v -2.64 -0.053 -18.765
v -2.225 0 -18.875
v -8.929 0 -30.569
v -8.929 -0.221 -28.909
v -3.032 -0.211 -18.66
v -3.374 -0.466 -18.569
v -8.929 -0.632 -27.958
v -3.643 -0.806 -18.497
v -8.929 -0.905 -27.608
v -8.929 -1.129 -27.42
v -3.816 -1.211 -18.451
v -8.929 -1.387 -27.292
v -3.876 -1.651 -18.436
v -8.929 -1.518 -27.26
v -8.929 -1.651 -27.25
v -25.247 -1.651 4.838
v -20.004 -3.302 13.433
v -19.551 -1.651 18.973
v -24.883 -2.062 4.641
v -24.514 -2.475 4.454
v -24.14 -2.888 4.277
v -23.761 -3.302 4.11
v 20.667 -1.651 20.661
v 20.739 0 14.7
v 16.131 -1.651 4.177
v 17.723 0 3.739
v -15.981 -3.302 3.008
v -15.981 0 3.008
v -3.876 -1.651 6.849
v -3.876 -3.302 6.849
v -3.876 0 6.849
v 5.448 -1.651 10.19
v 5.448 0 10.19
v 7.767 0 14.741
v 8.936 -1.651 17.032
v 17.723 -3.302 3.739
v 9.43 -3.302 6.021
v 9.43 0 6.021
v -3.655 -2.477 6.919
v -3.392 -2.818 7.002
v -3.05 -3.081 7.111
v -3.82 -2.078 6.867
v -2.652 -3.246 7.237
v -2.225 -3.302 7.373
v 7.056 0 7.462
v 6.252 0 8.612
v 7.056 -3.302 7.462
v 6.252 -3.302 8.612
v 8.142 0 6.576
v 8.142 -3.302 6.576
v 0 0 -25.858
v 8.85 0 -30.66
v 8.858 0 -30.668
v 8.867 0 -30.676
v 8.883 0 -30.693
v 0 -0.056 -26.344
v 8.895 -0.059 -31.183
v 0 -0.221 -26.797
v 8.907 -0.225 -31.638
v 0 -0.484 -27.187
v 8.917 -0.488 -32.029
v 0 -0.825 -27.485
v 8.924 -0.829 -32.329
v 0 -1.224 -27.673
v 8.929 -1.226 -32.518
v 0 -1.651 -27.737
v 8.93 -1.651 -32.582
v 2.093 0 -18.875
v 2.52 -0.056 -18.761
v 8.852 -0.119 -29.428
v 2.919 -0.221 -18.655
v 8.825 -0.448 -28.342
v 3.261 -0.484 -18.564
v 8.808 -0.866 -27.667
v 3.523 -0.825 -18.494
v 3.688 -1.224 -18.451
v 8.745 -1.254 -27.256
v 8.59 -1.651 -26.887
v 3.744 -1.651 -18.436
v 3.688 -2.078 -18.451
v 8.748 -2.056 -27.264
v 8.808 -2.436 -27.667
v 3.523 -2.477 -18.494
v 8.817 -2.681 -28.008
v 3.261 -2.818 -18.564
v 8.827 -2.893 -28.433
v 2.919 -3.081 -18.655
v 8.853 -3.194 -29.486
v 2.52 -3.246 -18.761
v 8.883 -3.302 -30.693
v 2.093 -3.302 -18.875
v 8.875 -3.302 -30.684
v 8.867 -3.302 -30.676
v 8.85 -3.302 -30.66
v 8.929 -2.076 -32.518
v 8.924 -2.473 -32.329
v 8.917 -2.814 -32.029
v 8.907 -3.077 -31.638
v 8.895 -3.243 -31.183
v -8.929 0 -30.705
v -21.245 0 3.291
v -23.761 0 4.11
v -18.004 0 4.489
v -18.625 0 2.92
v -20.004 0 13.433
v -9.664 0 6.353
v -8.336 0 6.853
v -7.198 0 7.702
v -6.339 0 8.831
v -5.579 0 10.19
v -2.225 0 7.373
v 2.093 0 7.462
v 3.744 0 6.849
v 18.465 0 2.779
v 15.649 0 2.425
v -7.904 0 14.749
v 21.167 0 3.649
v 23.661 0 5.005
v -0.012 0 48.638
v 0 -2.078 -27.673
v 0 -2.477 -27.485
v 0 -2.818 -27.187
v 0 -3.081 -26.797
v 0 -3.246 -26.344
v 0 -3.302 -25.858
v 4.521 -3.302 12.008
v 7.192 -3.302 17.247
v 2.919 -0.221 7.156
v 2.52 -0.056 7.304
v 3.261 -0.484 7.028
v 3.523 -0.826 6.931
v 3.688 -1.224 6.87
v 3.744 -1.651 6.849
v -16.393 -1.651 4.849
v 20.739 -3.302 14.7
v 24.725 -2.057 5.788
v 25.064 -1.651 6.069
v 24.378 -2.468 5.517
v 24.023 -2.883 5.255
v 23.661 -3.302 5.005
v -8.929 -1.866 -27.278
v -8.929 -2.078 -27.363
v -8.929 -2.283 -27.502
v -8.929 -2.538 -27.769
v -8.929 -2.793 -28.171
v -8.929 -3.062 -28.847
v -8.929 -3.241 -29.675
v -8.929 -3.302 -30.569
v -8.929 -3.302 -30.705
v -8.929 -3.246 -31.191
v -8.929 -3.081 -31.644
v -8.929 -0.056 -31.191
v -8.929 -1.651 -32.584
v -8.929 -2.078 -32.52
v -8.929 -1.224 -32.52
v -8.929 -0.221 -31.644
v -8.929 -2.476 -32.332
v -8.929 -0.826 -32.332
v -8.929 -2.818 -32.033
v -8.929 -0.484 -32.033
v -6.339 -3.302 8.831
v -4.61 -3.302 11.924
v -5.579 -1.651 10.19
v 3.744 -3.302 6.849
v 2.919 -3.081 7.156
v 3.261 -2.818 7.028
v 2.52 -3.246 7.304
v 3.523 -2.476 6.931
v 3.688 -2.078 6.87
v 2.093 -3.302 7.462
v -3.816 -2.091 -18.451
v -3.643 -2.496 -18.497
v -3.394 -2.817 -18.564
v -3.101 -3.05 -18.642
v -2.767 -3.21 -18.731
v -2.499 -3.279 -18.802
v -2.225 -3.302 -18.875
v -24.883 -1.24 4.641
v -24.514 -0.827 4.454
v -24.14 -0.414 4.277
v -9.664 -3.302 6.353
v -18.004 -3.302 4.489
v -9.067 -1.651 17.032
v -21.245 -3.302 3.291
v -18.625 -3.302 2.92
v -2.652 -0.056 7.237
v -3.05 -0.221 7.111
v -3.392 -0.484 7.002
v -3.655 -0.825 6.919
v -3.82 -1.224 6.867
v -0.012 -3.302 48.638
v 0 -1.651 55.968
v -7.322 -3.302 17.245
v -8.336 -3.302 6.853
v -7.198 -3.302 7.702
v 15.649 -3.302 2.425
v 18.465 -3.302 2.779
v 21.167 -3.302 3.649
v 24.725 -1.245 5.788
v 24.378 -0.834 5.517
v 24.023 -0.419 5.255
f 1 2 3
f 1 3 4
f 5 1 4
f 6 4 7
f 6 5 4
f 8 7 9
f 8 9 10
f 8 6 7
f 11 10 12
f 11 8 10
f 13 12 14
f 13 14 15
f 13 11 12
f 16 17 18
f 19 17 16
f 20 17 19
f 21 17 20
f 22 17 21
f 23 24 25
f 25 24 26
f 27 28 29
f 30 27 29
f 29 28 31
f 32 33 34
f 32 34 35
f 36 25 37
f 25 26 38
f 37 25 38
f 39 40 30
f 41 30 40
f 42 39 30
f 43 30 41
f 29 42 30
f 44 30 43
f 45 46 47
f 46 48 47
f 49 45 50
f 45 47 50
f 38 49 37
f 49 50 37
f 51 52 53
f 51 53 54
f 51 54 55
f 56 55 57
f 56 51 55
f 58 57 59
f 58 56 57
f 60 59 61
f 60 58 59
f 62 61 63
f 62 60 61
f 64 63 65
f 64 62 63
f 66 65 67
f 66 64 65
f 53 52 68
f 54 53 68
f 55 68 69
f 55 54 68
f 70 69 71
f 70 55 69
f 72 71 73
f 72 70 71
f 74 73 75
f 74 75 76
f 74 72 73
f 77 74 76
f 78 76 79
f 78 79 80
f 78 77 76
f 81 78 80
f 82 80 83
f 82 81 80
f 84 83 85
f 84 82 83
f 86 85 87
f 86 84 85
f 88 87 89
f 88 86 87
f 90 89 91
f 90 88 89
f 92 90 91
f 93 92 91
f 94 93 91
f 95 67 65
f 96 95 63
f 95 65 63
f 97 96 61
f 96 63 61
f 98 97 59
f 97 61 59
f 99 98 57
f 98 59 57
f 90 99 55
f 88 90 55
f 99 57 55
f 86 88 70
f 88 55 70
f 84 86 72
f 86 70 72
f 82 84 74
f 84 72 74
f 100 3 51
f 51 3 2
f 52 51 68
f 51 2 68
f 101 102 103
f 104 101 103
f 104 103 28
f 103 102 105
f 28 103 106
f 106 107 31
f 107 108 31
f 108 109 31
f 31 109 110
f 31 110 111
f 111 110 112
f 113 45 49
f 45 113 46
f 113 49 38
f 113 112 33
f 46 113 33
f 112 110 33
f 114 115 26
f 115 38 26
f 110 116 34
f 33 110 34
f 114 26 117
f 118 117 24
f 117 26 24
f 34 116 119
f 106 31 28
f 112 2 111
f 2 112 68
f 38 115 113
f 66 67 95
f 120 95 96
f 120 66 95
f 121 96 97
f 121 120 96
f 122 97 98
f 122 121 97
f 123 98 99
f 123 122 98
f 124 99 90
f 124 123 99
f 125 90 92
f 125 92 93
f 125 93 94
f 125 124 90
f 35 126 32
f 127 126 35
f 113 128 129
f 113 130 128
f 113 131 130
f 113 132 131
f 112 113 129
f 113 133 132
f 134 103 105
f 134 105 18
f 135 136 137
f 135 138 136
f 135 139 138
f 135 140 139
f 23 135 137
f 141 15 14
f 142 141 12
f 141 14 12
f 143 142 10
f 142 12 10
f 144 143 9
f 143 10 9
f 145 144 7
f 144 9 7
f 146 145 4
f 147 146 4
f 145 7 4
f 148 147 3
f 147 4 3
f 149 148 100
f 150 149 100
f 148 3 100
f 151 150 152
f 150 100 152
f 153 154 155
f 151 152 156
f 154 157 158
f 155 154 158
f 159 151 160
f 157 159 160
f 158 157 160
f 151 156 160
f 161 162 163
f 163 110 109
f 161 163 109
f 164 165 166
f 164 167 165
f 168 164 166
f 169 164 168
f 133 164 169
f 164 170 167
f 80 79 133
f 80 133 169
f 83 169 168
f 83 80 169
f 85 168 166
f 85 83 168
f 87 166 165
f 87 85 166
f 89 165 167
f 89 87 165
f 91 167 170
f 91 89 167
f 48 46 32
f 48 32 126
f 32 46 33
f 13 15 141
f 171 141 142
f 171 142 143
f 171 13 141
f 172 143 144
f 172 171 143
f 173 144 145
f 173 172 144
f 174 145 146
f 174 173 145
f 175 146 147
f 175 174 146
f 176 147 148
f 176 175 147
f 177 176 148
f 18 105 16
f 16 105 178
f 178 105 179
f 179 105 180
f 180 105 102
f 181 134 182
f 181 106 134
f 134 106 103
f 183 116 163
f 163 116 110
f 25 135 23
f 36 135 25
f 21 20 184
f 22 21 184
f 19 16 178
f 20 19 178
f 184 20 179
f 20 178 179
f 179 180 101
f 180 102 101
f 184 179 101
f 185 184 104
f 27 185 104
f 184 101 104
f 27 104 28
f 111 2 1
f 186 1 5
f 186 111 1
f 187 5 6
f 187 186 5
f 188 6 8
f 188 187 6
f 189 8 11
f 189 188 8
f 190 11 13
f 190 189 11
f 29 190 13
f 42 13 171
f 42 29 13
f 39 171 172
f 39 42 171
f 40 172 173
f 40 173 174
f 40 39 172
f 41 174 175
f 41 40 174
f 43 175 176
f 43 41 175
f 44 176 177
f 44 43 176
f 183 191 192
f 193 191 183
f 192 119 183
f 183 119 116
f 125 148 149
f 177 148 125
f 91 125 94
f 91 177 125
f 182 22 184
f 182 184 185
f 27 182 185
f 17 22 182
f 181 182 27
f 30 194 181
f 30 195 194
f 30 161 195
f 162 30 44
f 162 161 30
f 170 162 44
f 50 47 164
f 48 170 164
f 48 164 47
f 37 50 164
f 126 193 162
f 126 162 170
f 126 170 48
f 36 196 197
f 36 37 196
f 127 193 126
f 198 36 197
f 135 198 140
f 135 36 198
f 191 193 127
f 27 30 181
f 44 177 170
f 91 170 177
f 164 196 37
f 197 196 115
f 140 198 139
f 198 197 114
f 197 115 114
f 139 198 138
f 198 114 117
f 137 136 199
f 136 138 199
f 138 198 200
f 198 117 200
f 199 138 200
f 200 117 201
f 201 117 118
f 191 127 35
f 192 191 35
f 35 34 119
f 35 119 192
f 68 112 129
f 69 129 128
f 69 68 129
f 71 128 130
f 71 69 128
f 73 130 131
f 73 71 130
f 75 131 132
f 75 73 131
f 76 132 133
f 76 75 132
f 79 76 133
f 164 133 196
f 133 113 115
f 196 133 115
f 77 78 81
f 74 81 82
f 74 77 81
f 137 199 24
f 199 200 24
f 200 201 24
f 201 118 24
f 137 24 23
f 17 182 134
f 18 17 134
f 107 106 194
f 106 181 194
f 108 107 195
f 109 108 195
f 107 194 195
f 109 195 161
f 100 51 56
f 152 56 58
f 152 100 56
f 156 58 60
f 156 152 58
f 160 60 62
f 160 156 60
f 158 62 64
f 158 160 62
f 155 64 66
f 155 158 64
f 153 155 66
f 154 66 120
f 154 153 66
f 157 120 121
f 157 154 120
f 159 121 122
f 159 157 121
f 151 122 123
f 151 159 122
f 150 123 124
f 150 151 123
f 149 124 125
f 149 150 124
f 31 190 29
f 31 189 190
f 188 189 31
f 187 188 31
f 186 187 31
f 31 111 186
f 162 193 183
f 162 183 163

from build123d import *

# Parameters (mm, degrees)
F1_DEPTH      = 3.302
F2_SIZE       = 1.65099
F3_R          = 5.08
F4_T1_DEPTH   = 5.391144251
F4_T6_DEPTH   = 33.5393354473
F4_T12_DEPTH  = 33.5393354473
F4_T18_DEPTH  = 33.5393354473
F4_T24_DEPTH  = 33.5393354473
F4_T30_DEPTH  = 18.415
F4_T35_DEPTH  = 18.415
F4_T40_DEPTH  = 18.415
F4_T45_DEPTH  = 18.415
F4_T50_DEPTH  = 18.415
F4_T55_DEPTH  = 18.415
F4_T60_DEPTH  = 18.415
F4_T65_DEPTH  = 18.415
F4_T71_DEPTH  = 18.415
F4_T75_DEPTH  = 33.5393354473
F4_T82_DEPTH  = 33.5393354473
F4_T86_DEPTH  = 18.415
F4_T93_DEPTH  = 18.415
F4_T97_DEPTH  = 33.5393354473
F4_T104_DEPTH = 33.5393354473
F4_T108_DEPTH = 18.415
F4_T115_DEPTH = 18.415
F4_T119_DEPTH = 18.415
F4_T126_DEPTH = 18.415
F4_T130_DEPTH = 18.415


# Not quite as in the source:
# - a fillet or chamfer that OpenCascade refuses, or shapes differently, is made with other operations: its cross-section is extruded or revolved along the edge and cut away or added
# - a fillet or chamfer is up to 0.001 mm smaller than in the source, because OpenCascade refuses the exact size


with BuildPart() as f1:
    # F0 (on Front) → F1 (new body)
    with BuildSketch(Plane.XZ):
        Polygon((-8.9293484636, -27.2495914251), (-8.9293484636, -32.5835914251), (0, -27.7367021117), (8.9302421297, -32.5819446757), (8.7977098301, -27.2495914251), (3.7441806833, -18.4355433674), (-3.8758193167, -18.4355433674), align=None)
        Polygon((-3.8758193167, 6.8487920798), (-3.8758193167, -18.4355433674), (3.7441806833, -18.4355433674), (3.7441806833, 6.8487920798), (5.4475756045, 10.1900669473), (8.9355429432, 17.0318494737), (0, 55.9675879776), (-9.0671815766, 17.0318494737), (-5.5792142379, 10.1900669473), align=None)
        Polygon((-15.9811842538, 3.0082010134), (-3.8758193167, 6.8487920798), (-5.5792142379, 10.1900669473), (-7.4475542642, 6.8487920798), (-16.3927144946, 4.8489290213), align=None)
        Polygon((5.4475756045, 10.1900669473), (3.7441806833, 6.8487920798), (15.648767343, 2.4249005283), (16.1309282999, 4.1770842273), (7.269941736, 6.61542546), align=None)
        with BuildLine():
            ThreePointArc((-25.2471491773, 4.8381724725), (-20.7595085955, 3.1872557237), (-15.9811842538, 3.0082010134))
            Line((-15.9811842538, 3.0082010134), (-16.3927144946, 4.8489290213))
            Line((-16.3927144946, 4.8489290213), (-19.5505233946, 18.973449431))
            Line((-19.5505233946, 18.973449431), (-25.2471491773, 4.8381724725))
        make_face()
        with BuildLine():
            Line((16.1309282999, 4.1770842273), (15.648767343, 2.4249005283))
            ThreePointArc((15.648767343, 2.4249005283), (20.6670070739, 3.4448326602), (25.0641160129, 6.0694134893))
            Line((25.0641160129, 6.0694134893), (20.6670070739, 20.6612959236))
            Line((20.6670070739, 20.6612959236), (16.1309282999, 4.1770842273))
        make_face()
    extrude(amount=F1_DEPTH)

    # F2 (size 1.651 in the source; OpenCascade refuses exactly that, so slightly less here)
    f2_edges = [f1.edges().sort_by_distance(p)[0] for p in [
        (4.467771, -3.302, 36.499719),
        (-4.533591, -3.302, 36.499719),
        (18.398968, -3.302, 12.41919),
        (22.865562, -3.302, 13.365355),
        (-22.398836, -3.302, 11.905811),
        (-17.971619, -3.302, 11.911189),
        (18.398968, 0, 12.41919),
        (22.865562, 0, 13.365355),
        (-22.398836, 0, 11.905811),
        (-17.971619, 0, 11.911189),
        (7.191559, -3.302, 13.610958),
        (-7.323198, -3.302, 13.610958),
        (4.467771, 0, 36.499719),
        (-4.533591, 0, 36.499719),
    ]]
    chamfer(f2_edges, length=F2_SIZE)

    # F3
    f3_edges = [f1.edges().sort_by_distance(p)[0] for p in [
        (-7.447554, -1.651, 6.848792),
        (7.269942, -1.651, 6.615425),
    ]]
    fillet(f3_edges, radius=F3_R)

    # F4: fillet of radius 1.651 on 13 edges, made by hand

    # F4_s2 → F4_t1 (cut)
    with BuildSketch(Plane.XZ.offset(-1.0445721255)):
        with BuildLine():
            ThreePointArc((8.5898840158, -26.8871146962), (8.7475827705, -27.2636114555), (8.8080914983, -27.6672912803))
            Line((8.8080914983, -27.6672912803), (8.7977098301, -27.2495914251))
            Line((8.7977098301, -27.2495914251), (8.5898840158, -26.8871146962))
        make_face()
    extrude(amount=F4_T1_DEPTH, mode=Mode.SUBTRACT)


with BuildPart() as f4_tool4:
    # F4_s5 → F4_t6 (new body)
    with BuildSketch(Plane.XY.offset(10.9762920798)):
        with BuildLine():
            ThreePointArc((-3.8758193167, -1.651), (-3.3922526125, -2.8184332957), (-2.2248193167, -3.302))
            Line((-2.2248193167, -3.302), (-3.8758193167, -3.302))
            Line((-3.8758193167, -3.302), (-3.8758193167, -1.651))
        make_face()
    extrude(amount=-F4_T6_DEPTH)

    split(bisect_by=Plane(origin=(5.03803687, 0, -2.888555406), x_dir=(0, 1, 0), z_dir=(-0.8675244151, 0, 0.4973946011)), keep=Keep.TOP)

    split(bisect_by=Plane(origin=(-2.3286084058, 0, 7.3396657076), x_dir=(0, 1, 0), z_dir=(0.3024087454, 0, -0.9531783415)), keep=Keep.TOP)


with BuildPart() as f1_1:
    add(f1.part)

    # F4_t3: cut F4_tool4
    add(f4_tool4.part, mode=Mode.SUBTRACT)


with BuildPart() as f4_tool10:
    # F4_s11 → F4_t12 (new body)
    with BuildSketch(Plane.XY.offset(-22.5630433674)):
        with BuildLine():
            ThreePointArc((3.7441806833, -1.651), (3.260613979, -2.8184332957), (2.0931806833, -3.302))
            Line((2.0931806833, -3.302), (3.7441806833, -3.302))
            Line((3.7441806833, -3.302), (3.7441806833, -1.651))
        make_face()
    extrude(amount=F4_T12_DEPTH)

    split(bisect_by=Plane(origin=(2.6905919195, 0, 7.2403186875), x_dir=(0, 1, 0), z_dir=(-0.3483379174, 0, -0.9373690283)), keep=Keep.TOP)

    split(bisect_by=Plane(origin=(-5.1371079227, 0, -2.9453577344), x_dir=(0, 1, 0), z_dir=(0.8675244151, 0, 0.4973946011)), keep=Keep.TOP)


with BuildPart() as f1_2:
    add(f1_1.part)

    # F4_t9: cut F4_tool10
    add(f4_tool10.part, mode=Mode.SUBTRACT)


with BuildPart() as f4_tool16:
    # F4_s17 → F4_t18 (new body)
    with BuildSketch(Plane.XY.offset(10.9762920798)):
        with BuildLine():
            ThreePointArc((-2.2248193167, 0), (-3.3922526125, -0.4835667043), (-3.8758193167, -1.651))
            Line((-3.8758193167, -1.651), (-3.8758193167, 0))
            Line((-3.8758193167, 0), (-2.2248193167, 0))
        make_face()
    extrude(amount=-F4_T18_DEPTH)

    split(bisect_by=Plane(origin=(5.03803687, 0, -2.888555406), x_dir=(0, 1, 0), z_dir=(-0.8675244151, 0, 0.4973946011)), keep=Keep.TOP)

    split(bisect_by=Plane(origin=(-2.3286084058, 0, 7.3396657076), x_dir=(0, 1, 0), z_dir=(0.3024087454, 0, -0.9531783415)), keep=Keep.TOP)


with BuildPart() as f1_3:
    add(f1_2.part)

    # F4_t15: cut F4_tool16
    add(f4_tool16.part, mode=Mode.SUBTRACT)


with BuildPart() as f4_tool22:
    # F4_s23 → F4_t24 (new body)
    with BuildSketch(Plane.XY.offset(-22.5630433674)):
        with BuildLine():
            ThreePointArc((2.0931806833, 0), (3.260613979, -0.4835667043), (3.7441806833, -1.651))
            Line((3.7441806833, -1.651), (3.7441806833, 0))
            Line((3.7441806833, 0), (2.0931806833, 0))
        make_face()
    extrude(amount=F4_T24_DEPTH)

    split(bisect_by=Plane(origin=(2.6905919195, 0, 7.2403186875), x_dir=(0, 1, 0), z_dir=(-0.3483379174, 0, -0.9373690283)), keep=Keep.TOP)

    split(bisect_by=Plane(origin=(-5.1371079227, 0, -2.9453577344), x_dir=(0, 1, 0), z_dir=(0.8675244151, 0, 0.4973946011)), keep=Keep.TOP)


with BuildPart() as f1_4:
    add(f1_3.part)

    # F4_t21: cut F4_tool22
    add(f4_tool22.part, mode=Mode.SUBTRACT)


with BuildPart() as f4_tool28:
    # F4_s29 → F4_t30 (new body)
    with BuildSketch(Plane(origin=(-6.8608599708, 0, -11.966280938), x_dir=(0, 1, 0), z_dir=(-0.4973946011, 0, -0.8675244151))):
        with BuildLine():
            ThreePointArc((0, 7.4583718528), (-0.4835667043, 6.2909385571), (-1.651, 5.8073718528))
            Line((-1.651, 5.8073718528), (0, 5.8073718528))
            Line((0, 5.8073718528), (0, 7.4583718528))
        make_face()
    extrude(amount=F4_T30_DEPTH)

    split(bisect_by=Plane.YZ.offset(-3.8758193167), keep=Keep.BOTTOM)


with BuildPart() as f1_5:
    add(f1_4.part)

    # F4_t27: cut F4_tool28
    add(f4_tool28.part, mode=Mode.SUBTRACT)


with BuildPart() as f4_tool33:
    # F4_s34 → F4_t35 (new body)
    with BuildSketch(Plane(origin=(-6.8608599708, 0, -11.966280938), x_dir=(0, 1, 0), z_dir=(-0.4973946011, 0, -0.8675244151))):
        with BuildLine():
            ThreePointArc((-1.651, 5.8073718528), (-2.8184332957, 6.2909385571), (-3.302, 7.4583718528))
            Line((-3.302, 7.4583718528), (-3.302, 5.8073718528))
            Line((-3.302, 5.8073718528), (-1.651, 5.8073718528))
        make_face()
    extrude(amount=F4_T35_DEPTH)

    split(bisect_by=Plane.YZ.offset(-3.8758193167), keep=Keep.BOTTOM)


with BuildPart() as f1_6:
    add(f1_5.part)

    # F4_t32: cut F4_tool33
    add(f4_tool33.part, mode=Mode.SUBTRACT)


with BuildPart() as f4_tool38:
    # F4_s39 → F4_t40 (new body)
    with BuildSketch(Plane(origin=(-24.1861080645, 0, -13.1283250048), x_dir=(0, 1, 0), z_dir=(0.8788728803, 0, 0.4770560348))):
        with BuildLine():
            ThreePointArc((0, -22.7260352741), (-0.4835667043, -23.8934685698), (-1.651, -24.3770352741))
            Line((-1.651, -24.3770352741), (0, -24.3770352741))
            Line((0, -24.3770352741), (0, -22.7260352741))
        make_face()
    extrude(amount=F4_T40_DEPTH)

    split(bisect_by=Plane(origin=(-11.6264241962, 0, -21.4286037908), x_dir=(0, 1, 0), z_dir=(-0.4768939532, 0, -0.8789608395)), keep=Keep.TOP)


with BuildPart() as f1_7:
    add(f1_6.part)

    # F4_t37: cut F4_tool38
    add(f4_tool38.part, mode=Mode.SUBTRACT)


with BuildPart() as f4_tool43:
    # F4_s44 → F4_t45 (new body)
    with BuildSketch(Plane(origin=(-24.1861080645, 0, -13.1283250048), x_dir=(0, 1, 0), z_dir=(0.8788728803, 0, 0.4770560348))):
        with BuildLine():
            ThreePointArc((-1.651, -24.3770352741), (-2.8184332957, -23.8934685698), (-3.302, -22.7260352741))
            Line((-3.302, -22.7260352741), (-3.302, -24.3770352741))
            Line((-3.302, -24.3770352741), (-1.651, -24.3770352741))
        make_face()
    extrude(amount=F4_T45_DEPTH)

    split(bisect_by=Plane(origin=(-11.6264241962, 0, -21.4286037908), x_dir=(0, 1, 0), z_dir=(-0.4768939532, 0, -0.8789608395)), keep=Keep.TOP)


with BuildPart() as f1_8:
    add(f1_7.part)

    # F4_t42: cut F4_tool43
    add(f4_tool43.part, mode=Mode.SUBTRACT)


with BuildPart() as f4_tool48:
    # F4_s49 → F4_t50 (new body)
    with BuildSketch(Plane(origin=(15.9878139687, 0, -27.8849407141), x_dir=(0, 1, 0), z_dir=(-0.4973946011, 0, 0.8675244151))):
        with BuildLine():
            ThreePointArc((-1.651, 5.9215715813), (-2.8184332957, 6.4051382856), (-3.302, 7.5725715813))
            Line((-3.302, 7.5725715813), (-3.302, 5.9215715813))
            Line((-3.302, 5.9215715813), (-1.651, 5.9215715813))
        make_face()
    extrude(amount=F4_T50_DEPTH)

    split(bisect_by=Plane.YZ.offset(3.7441806833), keep=Keep.TOP)


with BuildPart() as f1_9:
    add(f1_8.part)

    # F4_t47: cut F4_tool48
    add(f4_tool48.part, mode=Mode.SUBTRACT)


with BuildPart() as f4_tool53:
    # F4_s54 → F4_t55 (new body)
    with BuildSketch(Plane(origin=(15.9878139687, 0, -27.8849407141), x_dir=(0, 1, 0), z_dir=(-0.4973946011, 0, 0.8675244151))):
        with BuildLine():
            ThreePointArc((0, 7.5725715813), (-0.4835667043, 6.4051382856), (-1.651, 5.9215715813))
            Line((-1.651, 5.9215715813), (0, 5.9215715813))
            Line((0, 5.9215715813), (0, 7.5725715813))
        make_face()
    extrude(amount=F4_T55_DEPTH)

    split(bisect_by=Plane.YZ.offset(3.7441806833), keep=Keep.TOP)


with BuildPart() as f1_10:
    add(f1_9.part)

    # F4_t52: cut F4_tool53
    add(f4_tool53.part, mode=Mode.SUBTRACT)


with BuildPart() as f4_tool58:
    # F4_s59 → F4_t60 (new body)
    with BuildSketch(Plane(origin=(7.998513331, 0, -4.3397185292), x_dir=(0, 1, 0), z_dir=(0.8789608395, 0, -0.4768939532))):
        with BuildLine():
            ThreePointArc((0, -22.7284749742), (-0.4835667043, -23.8959082699), (-1.651, -24.3794749742))
            Line((-1.651, -24.3794749742), (0, -24.3794749742))
            Line((0, -24.3794749742), (0, -22.7284749742))
        make_face()
    extrude(amount=F4_T60_DEPTH)

    split(bisect_by=Plane(origin=(11.6292117876, 0, -21.4243152038), x_dir=(0, 1, 0), z_dir=(0.4770560348, 0, -0.8788728803)), keep=Keep.TOP)


with BuildPart() as f1_11:
    add(f1_10.part)

    # F4_t57: cut F4_tool58
    add(f4_tool58.part, mode=Mode.SUBTRACT)


with BuildPart() as f4_tool63:
    # F4_s64 → F4_t65 (new body)
    with BuildSketch(Plane(origin=(7.998513331, 0, -4.3397185292), x_dir=(0, 1, 0), z_dir=(0.8789608395, 0, -0.4768939532))):
        with BuildLine():
            ThreePointArc((-1.651, -24.3794749742), (-2.8184332957, -23.8959082699), (-3.302, -22.7284749742))
            Line((-3.302, -22.7284749742), (-3.302, -24.3794749742))
            Line((-3.302, -24.3794749742), (-1.651, -24.3794749742))
        make_face()
    extrude(amount=F4_T65_DEPTH)

    split(bisect_by=Plane(origin=(11.6292117876, 0, -21.4243152038), x_dir=(0, 1, 0), z_dir=(0.4770560348, 0, -0.8788728803)), keep=Keep.TOP)


with BuildPart() as f1_12:
    add(f1_11.part)

    # F4_t62: cut F4_tool63
    add(f4_tool63.part, mode=Mode.SUBTRACT)


with BuildPart() as f4_tool69:
    # F4_s70 → F4_t71 (new body)
    with BuildSketch(Plane(origin=(-6.8608599708, 0, -11.966280938), x_dir=(0, 1, 0), z_dir=(-0.4973946011, 0, -0.8675244151))):
        with BuildLine():
            ThreePointArc((-1.651, 5.8073718528), (-2.8184332957, 6.2909385571), (-3.302, 7.4583718528))
            Line((-3.302, 7.4583718528), (-3.302, 5.8073718528))
            Line((-3.302, 5.8073718528), (-1.651, 5.8073718528))
        make_face()
    extrude(amount=F4_T71_DEPTH)

    split(bisect_by=Plane.YZ.offset(-3.8758193167), keep=Keep.TOP)


with BuildPart() as f4_tool73:
    # F4_s74 → F4_t75 (new body)
    with BuildSketch(Plane.XY.offset(10.9762920798)):
        with BuildLine():
            ThreePointArc((-3.8758193167, -1.651), (-3.3922526125, -2.8184332957), (-2.2248193167, -3.302))
            Line((-2.2248193167, -3.302), (-3.8758193167, -3.302))
            Line((-3.8758193167, -3.302), (-3.8758193167, -1.651))
        make_face()
    extrude(amount=-F4_T75_DEPTH)

    split(bisect_by=Plane(origin=(5.03803687, 0, -2.888555406), x_dir=(0, 1, 0), z_dir=(0.8675244151, 0, -0.4973946011)), keep=Keep.TOP)


with BuildPart() as f4_tool69_1:
    add(f4_tool69.part)

    # F4_t77: intersect F4_tool73
    add(f4_tool73.part, mode=Mode.INTERSECT)


with BuildPart() as f1_13:
    add(f1_12.part)

    # F4_t67: cut F4_tool69
    add(f4_tool69_1.part, mode=Mode.SUBTRACT)


with BuildPart() as f4_tool80:
    # F4_s81 → F4_t82 (new body)
    with BuildSketch(Plane.XY.offset(-22.5630433674)):
        with BuildLine():
            ThreePointArc((3.7441806833, -1.651), (3.260613979, -2.8184332957), (2.0931806833, -3.302))
            Line((2.0931806833, -3.302), (3.7441806833, -3.302))
            Line((3.7441806833, -3.302), (3.7441806833, -1.651))
        make_face()
    extrude(amount=F4_T82_DEPTH)

    split(bisect_by=Plane(origin=(-5.1371079227, 0, -2.9453577344), x_dir=(0, 1, 0), z_dir=(-0.8675244151, 0, -0.4973946011)), keep=Keep.TOP)


with BuildPart() as f4_tool84:
    # F4_s85 → F4_t86 (new body)
    with BuildSketch(Plane(origin=(15.9878139687, 0, -27.8849407141), x_dir=(0, 1, 0), z_dir=(-0.4973946011, 0, 0.8675244151))):
        with BuildLine():
            ThreePointArc((-1.651, 5.9215715813), (-2.8184332957, 6.4051382856), (-3.302, 7.5725715813))
            Line((-3.302, 7.5725715813), (-3.302, 5.9215715813))
            Line((-3.302, 5.9215715813), (-1.651, 5.9215715813))
        make_face()
    extrude(amount=F4_T86_DEPTH)

    split(bisect_by=Plane.YZ.offset(3.7441806833), keep=Keep.BOTTOM)


with BuildPart() as f4_tool80_1:
    add(f4_tool80.part)

    # F4_t88: intersect F4_tool84
    add(f4_tool84.part, mode=Mode.INTERSECT)


with BuildPart() as f1_14:
    add(f1_13.part)

    # F4_t78: cut F4_tool80
    add(f4_tool80_1.part, mode=Mode.SUBTRACT)


with BuildPart() as f4_tool91:
    # F4_s92 → F4_t93 (new body)
    with BuildSketch(Plane(origin=(-6.8608599708, 0, -11.966280938), x_dir=(0, 1, 0), z_dir=(-0.4973946011, 0, -0.8675244151))):
        with BuildLine():
            ThreePointArc((0, 7.4583718528), (-0.4835667043, 6.2909385571), (-1.651, 5.8073718528))
            Line((-1.651, 5.8073718528), (0, 5.8073718528))
            Line((0, 5.8073718528), (0, 7.4583718528))
        make_face()
    extrude(amount=F4_T93_DEPTH)

    split(bisect_by=Plane.YZ.offset(-3.8758193167), keep=Keep.TOP)


with BuildPart() as f4_tool95:
    # F4_s96 → F4_t97 (new body)
    with BuildSketch(Plane.XY.offset(10.9762920798)):
        with BuildLine():
            ThreePointArc((-2.2248193167, 0), (-3.3922526125, -0.4835667043), (-3.8758193167, -1.651))
            Line((-3.8758193167, -1.651), (-3.8758193167, 0))
            Line((-3.8758193167, 0), (-2.2248193167, 0))
        make_face()
    extrude(amount=-F4_T97_DEPTH)

    split(bisect_by=Plane(origin=(5.03803687, 0, -2.888555406), x_dir=(0, 1, 0), z_dir=(0.8675244151, 0, -0.4973946011)), keep=Keep.TOP)


with BuildPart() as f4_tool91_1:
    add(f4_tool91.part)

    # F4_t99: intersect F4_tool95
    add(f4_tool95.part, mode=Mode.INTERSECT)


with BuildPart() as f1_15:
    add(f1_14.part)

    # F4_t89: cut F4_tool91
    add(f4_tool91_1.part, mode=Mode.SUBTRACT)


with BuildPart() as f4_tool102:
    # F4_s103 → F4_t104 (new body)
    with BuildSketch(Plane.XY.offset(-22.5630433674)):
        with BuildLine():
            ThreePointArc((2.0931806833, 0), (3.260613979, -0.4835667043), (3.7441806833, -1.651))
            Line((3.7441806833, -1.651), (3.7441806833, 0))
            Line((3.7441806833, 0), (2.0931806833, 0))
        make_face()
    extrude(amount=F4_T104_DEPTH)

    split(bisect_by=Plane(origin=(-5.1371079227, 0, -2.9453577344), x_dir=(0, 1, 0), z_dir=(-0.8675244151, 0, -0.4973946011)), keep=Keep.TOP)


with BuildPart() as f4_tool106:
    # F4_s107 → F4_t108 (new body)
    with BuildSketch(Plane(origin=(15.9878139687, 0, -27.8849407141), x_dir=(0, 1, 0), z_dir=(-0.4973946011, 0, 0.8675244151))):
        with BuildLine():
            ThreePointArc((0, 7.5725715813), (-0.4835667043, 6.4051382856), (-1.651, 5.9215715813))
            Line((-1.651, 5.9215715813), (0, 5.9215715813))
            Line((0, 5.9215715813), (0, 7.5725715813))
        make_face()
    extrude(amount=F4_T108_DEPTH)

    split(bisect_by=Plane.YZ.offset(3.7441806833), keep=Keep.BOTTOM)


with BuildPart() as f4_tool102_1:
    add(f4_tool102.part)

    # F4_t110: intersect F4_tool106
    add(f4_tool106.part, mode=Mode.INTERSECT)


with BuildPart() as f1_16:
    add(f1_15.part)

    # F4_t100: cut F4_tool102
    add(f4_tool102_1.part, mode=Mode.SUBTRACT)


with BuildPart() as f4_tool113:
    # F4_s114 → F4_t115 (new body)
    with BuildSketch(Plane(origin=(7.998513331, 0, -4.3397185292), x_dir=(0, 1, 0), z_dir=(0.8789608395, 0, -0.4768939532))):
        with BuildLine():
            ThreePointArc((0, -22.7284749742), (-0.4835667043, -23.8959082699), (-1.651, -24.3794749742))
            Line((-1.651, -24.3794749742), (0, -24.3794749742))
            Line((0, -24.3794749742), (0, -22.7284749742))
        make_face()
    extrude(amount=F4_T115_DEPTH)

    split(bisect_by=Plane(origin=(11.6292117876, 0, -21.4243152038), x_dir=(0, 1, 0), z_dir=(-0.4770560348, 0, 0.8788728803)), keep=Keep.TOP)


with BuildPart() as f4_tool117:
    # F4_s118 → F4_t119 (new body)
    with BuildSketch(Plane(origin=(-24.1861080645, 0, -13.1283250048), x_dir=(0, 1, 0), z_dir=(0.8788728803, 0, 0.4770560348))):
        with BuildLine():
            ThreePointArc((0, -22.7260352741), (-0.4835667043, -23.8934685698), (-1.651, -24.3770352741))
            Line((-1.651, -24.3770352741), (0, -24.3770352741))
            Line((0, -24.3770352741), (0, -22.7260352741))
        make_face()
    extrude(amount=F4_T119_DEPTH)

    split(bisect_by=Plane(origin=(-11.6264241962, 0, -21.4286037908), x_dir=(0, 1, 0), z_dir=(0.4768939532, 0, 0.8789608395)), keep=Keep.TOP)


with BuildPart() as f4_tool113_1:
    add(f4_tool113.part)

    # F4_t121: intersect F4_tool117
    add(f4_tool117.part, mode=Mode.INTERSECT)


with BuildPart() as f1_17:
    add(f1_16.part)

    # F4_t111: cut F4_tool113
    add(f4_tool113_1.part, mode=Mode.SUBTRACT)


with BuildPart() as f4_tool124:
    # F4_s125 → F4_t126 (new body)
    with BuildSketch(Plane(origin=(7.998513331, 0, -4.3397185292), x_dir=(0, 1, 0), z_dir=(0.8789608395, 0, -0.4768939532))):
        with BuildLine():
            ThreePointArc((-1.651, -24.3794749742), (-2.8184332957, -23.8959082699), (-3.302, -22.7284749742))
            Line((-3.302, -22.7284749742), (-3.302, -24.3794749742))
            Line((-3.302, -24.3794749742), (-1.651, -24.3794749742))
        make_face()
    extrude(amount=F4_T126_DEPTH)

    split(bisect_by=Plane(origin=(11.6292117876, 0, -21.4243152038), x_dir=(0, 1, 0), z_dir=(-0.4770560348, 0, 0.8788728803)), keep=Keep.TOP)


with BuildPart() as f4_tool128:
    # F4_s129 → F4_t130 (new body)
    with BuildSketch(Plane(origin=(-24.1861080645, 0, -13.1283250048), x_dir=(0, 1, 0), z_dir=(0.8788728803, 0, 0.4770560348))):
        with BuildLine():
            ThreePointArc((-1.651, -24.3770352741), (-2.8184332957, -23.8934685698), (-3.302, -22.7260352741))
            Line((-3.302, -22.7260352741), (-3.302, -24.3770352741))
            Line((-3.302, -24.3770352741), (-1.651, -24.3770352741))
        make_face()
    extrude(amount=F4_T130_DEPTH)

    split(bisect_by=Plane(origin=(-11.6264241962, 0, -21.4286037908), x_dir=(0, 1, 0), z_dir=(0.4768939532, 0, 0.8789608395)), keep=Keep.TOP)


with BuildPart() as f4_tool124_1:
    add(f4_tool124.part)

    # F4_t132: intersect F4_tool128
    add(f4_tool128.part, mode=Mode.INTERSECT)


with BuildPart() as f1_18:
    add(f1_17.part)

    # F4_t122: cut F4_tool124
    add(f4_tool124_1.part, mode=Mode.SUBTRACT)


solid = f1_18.part
